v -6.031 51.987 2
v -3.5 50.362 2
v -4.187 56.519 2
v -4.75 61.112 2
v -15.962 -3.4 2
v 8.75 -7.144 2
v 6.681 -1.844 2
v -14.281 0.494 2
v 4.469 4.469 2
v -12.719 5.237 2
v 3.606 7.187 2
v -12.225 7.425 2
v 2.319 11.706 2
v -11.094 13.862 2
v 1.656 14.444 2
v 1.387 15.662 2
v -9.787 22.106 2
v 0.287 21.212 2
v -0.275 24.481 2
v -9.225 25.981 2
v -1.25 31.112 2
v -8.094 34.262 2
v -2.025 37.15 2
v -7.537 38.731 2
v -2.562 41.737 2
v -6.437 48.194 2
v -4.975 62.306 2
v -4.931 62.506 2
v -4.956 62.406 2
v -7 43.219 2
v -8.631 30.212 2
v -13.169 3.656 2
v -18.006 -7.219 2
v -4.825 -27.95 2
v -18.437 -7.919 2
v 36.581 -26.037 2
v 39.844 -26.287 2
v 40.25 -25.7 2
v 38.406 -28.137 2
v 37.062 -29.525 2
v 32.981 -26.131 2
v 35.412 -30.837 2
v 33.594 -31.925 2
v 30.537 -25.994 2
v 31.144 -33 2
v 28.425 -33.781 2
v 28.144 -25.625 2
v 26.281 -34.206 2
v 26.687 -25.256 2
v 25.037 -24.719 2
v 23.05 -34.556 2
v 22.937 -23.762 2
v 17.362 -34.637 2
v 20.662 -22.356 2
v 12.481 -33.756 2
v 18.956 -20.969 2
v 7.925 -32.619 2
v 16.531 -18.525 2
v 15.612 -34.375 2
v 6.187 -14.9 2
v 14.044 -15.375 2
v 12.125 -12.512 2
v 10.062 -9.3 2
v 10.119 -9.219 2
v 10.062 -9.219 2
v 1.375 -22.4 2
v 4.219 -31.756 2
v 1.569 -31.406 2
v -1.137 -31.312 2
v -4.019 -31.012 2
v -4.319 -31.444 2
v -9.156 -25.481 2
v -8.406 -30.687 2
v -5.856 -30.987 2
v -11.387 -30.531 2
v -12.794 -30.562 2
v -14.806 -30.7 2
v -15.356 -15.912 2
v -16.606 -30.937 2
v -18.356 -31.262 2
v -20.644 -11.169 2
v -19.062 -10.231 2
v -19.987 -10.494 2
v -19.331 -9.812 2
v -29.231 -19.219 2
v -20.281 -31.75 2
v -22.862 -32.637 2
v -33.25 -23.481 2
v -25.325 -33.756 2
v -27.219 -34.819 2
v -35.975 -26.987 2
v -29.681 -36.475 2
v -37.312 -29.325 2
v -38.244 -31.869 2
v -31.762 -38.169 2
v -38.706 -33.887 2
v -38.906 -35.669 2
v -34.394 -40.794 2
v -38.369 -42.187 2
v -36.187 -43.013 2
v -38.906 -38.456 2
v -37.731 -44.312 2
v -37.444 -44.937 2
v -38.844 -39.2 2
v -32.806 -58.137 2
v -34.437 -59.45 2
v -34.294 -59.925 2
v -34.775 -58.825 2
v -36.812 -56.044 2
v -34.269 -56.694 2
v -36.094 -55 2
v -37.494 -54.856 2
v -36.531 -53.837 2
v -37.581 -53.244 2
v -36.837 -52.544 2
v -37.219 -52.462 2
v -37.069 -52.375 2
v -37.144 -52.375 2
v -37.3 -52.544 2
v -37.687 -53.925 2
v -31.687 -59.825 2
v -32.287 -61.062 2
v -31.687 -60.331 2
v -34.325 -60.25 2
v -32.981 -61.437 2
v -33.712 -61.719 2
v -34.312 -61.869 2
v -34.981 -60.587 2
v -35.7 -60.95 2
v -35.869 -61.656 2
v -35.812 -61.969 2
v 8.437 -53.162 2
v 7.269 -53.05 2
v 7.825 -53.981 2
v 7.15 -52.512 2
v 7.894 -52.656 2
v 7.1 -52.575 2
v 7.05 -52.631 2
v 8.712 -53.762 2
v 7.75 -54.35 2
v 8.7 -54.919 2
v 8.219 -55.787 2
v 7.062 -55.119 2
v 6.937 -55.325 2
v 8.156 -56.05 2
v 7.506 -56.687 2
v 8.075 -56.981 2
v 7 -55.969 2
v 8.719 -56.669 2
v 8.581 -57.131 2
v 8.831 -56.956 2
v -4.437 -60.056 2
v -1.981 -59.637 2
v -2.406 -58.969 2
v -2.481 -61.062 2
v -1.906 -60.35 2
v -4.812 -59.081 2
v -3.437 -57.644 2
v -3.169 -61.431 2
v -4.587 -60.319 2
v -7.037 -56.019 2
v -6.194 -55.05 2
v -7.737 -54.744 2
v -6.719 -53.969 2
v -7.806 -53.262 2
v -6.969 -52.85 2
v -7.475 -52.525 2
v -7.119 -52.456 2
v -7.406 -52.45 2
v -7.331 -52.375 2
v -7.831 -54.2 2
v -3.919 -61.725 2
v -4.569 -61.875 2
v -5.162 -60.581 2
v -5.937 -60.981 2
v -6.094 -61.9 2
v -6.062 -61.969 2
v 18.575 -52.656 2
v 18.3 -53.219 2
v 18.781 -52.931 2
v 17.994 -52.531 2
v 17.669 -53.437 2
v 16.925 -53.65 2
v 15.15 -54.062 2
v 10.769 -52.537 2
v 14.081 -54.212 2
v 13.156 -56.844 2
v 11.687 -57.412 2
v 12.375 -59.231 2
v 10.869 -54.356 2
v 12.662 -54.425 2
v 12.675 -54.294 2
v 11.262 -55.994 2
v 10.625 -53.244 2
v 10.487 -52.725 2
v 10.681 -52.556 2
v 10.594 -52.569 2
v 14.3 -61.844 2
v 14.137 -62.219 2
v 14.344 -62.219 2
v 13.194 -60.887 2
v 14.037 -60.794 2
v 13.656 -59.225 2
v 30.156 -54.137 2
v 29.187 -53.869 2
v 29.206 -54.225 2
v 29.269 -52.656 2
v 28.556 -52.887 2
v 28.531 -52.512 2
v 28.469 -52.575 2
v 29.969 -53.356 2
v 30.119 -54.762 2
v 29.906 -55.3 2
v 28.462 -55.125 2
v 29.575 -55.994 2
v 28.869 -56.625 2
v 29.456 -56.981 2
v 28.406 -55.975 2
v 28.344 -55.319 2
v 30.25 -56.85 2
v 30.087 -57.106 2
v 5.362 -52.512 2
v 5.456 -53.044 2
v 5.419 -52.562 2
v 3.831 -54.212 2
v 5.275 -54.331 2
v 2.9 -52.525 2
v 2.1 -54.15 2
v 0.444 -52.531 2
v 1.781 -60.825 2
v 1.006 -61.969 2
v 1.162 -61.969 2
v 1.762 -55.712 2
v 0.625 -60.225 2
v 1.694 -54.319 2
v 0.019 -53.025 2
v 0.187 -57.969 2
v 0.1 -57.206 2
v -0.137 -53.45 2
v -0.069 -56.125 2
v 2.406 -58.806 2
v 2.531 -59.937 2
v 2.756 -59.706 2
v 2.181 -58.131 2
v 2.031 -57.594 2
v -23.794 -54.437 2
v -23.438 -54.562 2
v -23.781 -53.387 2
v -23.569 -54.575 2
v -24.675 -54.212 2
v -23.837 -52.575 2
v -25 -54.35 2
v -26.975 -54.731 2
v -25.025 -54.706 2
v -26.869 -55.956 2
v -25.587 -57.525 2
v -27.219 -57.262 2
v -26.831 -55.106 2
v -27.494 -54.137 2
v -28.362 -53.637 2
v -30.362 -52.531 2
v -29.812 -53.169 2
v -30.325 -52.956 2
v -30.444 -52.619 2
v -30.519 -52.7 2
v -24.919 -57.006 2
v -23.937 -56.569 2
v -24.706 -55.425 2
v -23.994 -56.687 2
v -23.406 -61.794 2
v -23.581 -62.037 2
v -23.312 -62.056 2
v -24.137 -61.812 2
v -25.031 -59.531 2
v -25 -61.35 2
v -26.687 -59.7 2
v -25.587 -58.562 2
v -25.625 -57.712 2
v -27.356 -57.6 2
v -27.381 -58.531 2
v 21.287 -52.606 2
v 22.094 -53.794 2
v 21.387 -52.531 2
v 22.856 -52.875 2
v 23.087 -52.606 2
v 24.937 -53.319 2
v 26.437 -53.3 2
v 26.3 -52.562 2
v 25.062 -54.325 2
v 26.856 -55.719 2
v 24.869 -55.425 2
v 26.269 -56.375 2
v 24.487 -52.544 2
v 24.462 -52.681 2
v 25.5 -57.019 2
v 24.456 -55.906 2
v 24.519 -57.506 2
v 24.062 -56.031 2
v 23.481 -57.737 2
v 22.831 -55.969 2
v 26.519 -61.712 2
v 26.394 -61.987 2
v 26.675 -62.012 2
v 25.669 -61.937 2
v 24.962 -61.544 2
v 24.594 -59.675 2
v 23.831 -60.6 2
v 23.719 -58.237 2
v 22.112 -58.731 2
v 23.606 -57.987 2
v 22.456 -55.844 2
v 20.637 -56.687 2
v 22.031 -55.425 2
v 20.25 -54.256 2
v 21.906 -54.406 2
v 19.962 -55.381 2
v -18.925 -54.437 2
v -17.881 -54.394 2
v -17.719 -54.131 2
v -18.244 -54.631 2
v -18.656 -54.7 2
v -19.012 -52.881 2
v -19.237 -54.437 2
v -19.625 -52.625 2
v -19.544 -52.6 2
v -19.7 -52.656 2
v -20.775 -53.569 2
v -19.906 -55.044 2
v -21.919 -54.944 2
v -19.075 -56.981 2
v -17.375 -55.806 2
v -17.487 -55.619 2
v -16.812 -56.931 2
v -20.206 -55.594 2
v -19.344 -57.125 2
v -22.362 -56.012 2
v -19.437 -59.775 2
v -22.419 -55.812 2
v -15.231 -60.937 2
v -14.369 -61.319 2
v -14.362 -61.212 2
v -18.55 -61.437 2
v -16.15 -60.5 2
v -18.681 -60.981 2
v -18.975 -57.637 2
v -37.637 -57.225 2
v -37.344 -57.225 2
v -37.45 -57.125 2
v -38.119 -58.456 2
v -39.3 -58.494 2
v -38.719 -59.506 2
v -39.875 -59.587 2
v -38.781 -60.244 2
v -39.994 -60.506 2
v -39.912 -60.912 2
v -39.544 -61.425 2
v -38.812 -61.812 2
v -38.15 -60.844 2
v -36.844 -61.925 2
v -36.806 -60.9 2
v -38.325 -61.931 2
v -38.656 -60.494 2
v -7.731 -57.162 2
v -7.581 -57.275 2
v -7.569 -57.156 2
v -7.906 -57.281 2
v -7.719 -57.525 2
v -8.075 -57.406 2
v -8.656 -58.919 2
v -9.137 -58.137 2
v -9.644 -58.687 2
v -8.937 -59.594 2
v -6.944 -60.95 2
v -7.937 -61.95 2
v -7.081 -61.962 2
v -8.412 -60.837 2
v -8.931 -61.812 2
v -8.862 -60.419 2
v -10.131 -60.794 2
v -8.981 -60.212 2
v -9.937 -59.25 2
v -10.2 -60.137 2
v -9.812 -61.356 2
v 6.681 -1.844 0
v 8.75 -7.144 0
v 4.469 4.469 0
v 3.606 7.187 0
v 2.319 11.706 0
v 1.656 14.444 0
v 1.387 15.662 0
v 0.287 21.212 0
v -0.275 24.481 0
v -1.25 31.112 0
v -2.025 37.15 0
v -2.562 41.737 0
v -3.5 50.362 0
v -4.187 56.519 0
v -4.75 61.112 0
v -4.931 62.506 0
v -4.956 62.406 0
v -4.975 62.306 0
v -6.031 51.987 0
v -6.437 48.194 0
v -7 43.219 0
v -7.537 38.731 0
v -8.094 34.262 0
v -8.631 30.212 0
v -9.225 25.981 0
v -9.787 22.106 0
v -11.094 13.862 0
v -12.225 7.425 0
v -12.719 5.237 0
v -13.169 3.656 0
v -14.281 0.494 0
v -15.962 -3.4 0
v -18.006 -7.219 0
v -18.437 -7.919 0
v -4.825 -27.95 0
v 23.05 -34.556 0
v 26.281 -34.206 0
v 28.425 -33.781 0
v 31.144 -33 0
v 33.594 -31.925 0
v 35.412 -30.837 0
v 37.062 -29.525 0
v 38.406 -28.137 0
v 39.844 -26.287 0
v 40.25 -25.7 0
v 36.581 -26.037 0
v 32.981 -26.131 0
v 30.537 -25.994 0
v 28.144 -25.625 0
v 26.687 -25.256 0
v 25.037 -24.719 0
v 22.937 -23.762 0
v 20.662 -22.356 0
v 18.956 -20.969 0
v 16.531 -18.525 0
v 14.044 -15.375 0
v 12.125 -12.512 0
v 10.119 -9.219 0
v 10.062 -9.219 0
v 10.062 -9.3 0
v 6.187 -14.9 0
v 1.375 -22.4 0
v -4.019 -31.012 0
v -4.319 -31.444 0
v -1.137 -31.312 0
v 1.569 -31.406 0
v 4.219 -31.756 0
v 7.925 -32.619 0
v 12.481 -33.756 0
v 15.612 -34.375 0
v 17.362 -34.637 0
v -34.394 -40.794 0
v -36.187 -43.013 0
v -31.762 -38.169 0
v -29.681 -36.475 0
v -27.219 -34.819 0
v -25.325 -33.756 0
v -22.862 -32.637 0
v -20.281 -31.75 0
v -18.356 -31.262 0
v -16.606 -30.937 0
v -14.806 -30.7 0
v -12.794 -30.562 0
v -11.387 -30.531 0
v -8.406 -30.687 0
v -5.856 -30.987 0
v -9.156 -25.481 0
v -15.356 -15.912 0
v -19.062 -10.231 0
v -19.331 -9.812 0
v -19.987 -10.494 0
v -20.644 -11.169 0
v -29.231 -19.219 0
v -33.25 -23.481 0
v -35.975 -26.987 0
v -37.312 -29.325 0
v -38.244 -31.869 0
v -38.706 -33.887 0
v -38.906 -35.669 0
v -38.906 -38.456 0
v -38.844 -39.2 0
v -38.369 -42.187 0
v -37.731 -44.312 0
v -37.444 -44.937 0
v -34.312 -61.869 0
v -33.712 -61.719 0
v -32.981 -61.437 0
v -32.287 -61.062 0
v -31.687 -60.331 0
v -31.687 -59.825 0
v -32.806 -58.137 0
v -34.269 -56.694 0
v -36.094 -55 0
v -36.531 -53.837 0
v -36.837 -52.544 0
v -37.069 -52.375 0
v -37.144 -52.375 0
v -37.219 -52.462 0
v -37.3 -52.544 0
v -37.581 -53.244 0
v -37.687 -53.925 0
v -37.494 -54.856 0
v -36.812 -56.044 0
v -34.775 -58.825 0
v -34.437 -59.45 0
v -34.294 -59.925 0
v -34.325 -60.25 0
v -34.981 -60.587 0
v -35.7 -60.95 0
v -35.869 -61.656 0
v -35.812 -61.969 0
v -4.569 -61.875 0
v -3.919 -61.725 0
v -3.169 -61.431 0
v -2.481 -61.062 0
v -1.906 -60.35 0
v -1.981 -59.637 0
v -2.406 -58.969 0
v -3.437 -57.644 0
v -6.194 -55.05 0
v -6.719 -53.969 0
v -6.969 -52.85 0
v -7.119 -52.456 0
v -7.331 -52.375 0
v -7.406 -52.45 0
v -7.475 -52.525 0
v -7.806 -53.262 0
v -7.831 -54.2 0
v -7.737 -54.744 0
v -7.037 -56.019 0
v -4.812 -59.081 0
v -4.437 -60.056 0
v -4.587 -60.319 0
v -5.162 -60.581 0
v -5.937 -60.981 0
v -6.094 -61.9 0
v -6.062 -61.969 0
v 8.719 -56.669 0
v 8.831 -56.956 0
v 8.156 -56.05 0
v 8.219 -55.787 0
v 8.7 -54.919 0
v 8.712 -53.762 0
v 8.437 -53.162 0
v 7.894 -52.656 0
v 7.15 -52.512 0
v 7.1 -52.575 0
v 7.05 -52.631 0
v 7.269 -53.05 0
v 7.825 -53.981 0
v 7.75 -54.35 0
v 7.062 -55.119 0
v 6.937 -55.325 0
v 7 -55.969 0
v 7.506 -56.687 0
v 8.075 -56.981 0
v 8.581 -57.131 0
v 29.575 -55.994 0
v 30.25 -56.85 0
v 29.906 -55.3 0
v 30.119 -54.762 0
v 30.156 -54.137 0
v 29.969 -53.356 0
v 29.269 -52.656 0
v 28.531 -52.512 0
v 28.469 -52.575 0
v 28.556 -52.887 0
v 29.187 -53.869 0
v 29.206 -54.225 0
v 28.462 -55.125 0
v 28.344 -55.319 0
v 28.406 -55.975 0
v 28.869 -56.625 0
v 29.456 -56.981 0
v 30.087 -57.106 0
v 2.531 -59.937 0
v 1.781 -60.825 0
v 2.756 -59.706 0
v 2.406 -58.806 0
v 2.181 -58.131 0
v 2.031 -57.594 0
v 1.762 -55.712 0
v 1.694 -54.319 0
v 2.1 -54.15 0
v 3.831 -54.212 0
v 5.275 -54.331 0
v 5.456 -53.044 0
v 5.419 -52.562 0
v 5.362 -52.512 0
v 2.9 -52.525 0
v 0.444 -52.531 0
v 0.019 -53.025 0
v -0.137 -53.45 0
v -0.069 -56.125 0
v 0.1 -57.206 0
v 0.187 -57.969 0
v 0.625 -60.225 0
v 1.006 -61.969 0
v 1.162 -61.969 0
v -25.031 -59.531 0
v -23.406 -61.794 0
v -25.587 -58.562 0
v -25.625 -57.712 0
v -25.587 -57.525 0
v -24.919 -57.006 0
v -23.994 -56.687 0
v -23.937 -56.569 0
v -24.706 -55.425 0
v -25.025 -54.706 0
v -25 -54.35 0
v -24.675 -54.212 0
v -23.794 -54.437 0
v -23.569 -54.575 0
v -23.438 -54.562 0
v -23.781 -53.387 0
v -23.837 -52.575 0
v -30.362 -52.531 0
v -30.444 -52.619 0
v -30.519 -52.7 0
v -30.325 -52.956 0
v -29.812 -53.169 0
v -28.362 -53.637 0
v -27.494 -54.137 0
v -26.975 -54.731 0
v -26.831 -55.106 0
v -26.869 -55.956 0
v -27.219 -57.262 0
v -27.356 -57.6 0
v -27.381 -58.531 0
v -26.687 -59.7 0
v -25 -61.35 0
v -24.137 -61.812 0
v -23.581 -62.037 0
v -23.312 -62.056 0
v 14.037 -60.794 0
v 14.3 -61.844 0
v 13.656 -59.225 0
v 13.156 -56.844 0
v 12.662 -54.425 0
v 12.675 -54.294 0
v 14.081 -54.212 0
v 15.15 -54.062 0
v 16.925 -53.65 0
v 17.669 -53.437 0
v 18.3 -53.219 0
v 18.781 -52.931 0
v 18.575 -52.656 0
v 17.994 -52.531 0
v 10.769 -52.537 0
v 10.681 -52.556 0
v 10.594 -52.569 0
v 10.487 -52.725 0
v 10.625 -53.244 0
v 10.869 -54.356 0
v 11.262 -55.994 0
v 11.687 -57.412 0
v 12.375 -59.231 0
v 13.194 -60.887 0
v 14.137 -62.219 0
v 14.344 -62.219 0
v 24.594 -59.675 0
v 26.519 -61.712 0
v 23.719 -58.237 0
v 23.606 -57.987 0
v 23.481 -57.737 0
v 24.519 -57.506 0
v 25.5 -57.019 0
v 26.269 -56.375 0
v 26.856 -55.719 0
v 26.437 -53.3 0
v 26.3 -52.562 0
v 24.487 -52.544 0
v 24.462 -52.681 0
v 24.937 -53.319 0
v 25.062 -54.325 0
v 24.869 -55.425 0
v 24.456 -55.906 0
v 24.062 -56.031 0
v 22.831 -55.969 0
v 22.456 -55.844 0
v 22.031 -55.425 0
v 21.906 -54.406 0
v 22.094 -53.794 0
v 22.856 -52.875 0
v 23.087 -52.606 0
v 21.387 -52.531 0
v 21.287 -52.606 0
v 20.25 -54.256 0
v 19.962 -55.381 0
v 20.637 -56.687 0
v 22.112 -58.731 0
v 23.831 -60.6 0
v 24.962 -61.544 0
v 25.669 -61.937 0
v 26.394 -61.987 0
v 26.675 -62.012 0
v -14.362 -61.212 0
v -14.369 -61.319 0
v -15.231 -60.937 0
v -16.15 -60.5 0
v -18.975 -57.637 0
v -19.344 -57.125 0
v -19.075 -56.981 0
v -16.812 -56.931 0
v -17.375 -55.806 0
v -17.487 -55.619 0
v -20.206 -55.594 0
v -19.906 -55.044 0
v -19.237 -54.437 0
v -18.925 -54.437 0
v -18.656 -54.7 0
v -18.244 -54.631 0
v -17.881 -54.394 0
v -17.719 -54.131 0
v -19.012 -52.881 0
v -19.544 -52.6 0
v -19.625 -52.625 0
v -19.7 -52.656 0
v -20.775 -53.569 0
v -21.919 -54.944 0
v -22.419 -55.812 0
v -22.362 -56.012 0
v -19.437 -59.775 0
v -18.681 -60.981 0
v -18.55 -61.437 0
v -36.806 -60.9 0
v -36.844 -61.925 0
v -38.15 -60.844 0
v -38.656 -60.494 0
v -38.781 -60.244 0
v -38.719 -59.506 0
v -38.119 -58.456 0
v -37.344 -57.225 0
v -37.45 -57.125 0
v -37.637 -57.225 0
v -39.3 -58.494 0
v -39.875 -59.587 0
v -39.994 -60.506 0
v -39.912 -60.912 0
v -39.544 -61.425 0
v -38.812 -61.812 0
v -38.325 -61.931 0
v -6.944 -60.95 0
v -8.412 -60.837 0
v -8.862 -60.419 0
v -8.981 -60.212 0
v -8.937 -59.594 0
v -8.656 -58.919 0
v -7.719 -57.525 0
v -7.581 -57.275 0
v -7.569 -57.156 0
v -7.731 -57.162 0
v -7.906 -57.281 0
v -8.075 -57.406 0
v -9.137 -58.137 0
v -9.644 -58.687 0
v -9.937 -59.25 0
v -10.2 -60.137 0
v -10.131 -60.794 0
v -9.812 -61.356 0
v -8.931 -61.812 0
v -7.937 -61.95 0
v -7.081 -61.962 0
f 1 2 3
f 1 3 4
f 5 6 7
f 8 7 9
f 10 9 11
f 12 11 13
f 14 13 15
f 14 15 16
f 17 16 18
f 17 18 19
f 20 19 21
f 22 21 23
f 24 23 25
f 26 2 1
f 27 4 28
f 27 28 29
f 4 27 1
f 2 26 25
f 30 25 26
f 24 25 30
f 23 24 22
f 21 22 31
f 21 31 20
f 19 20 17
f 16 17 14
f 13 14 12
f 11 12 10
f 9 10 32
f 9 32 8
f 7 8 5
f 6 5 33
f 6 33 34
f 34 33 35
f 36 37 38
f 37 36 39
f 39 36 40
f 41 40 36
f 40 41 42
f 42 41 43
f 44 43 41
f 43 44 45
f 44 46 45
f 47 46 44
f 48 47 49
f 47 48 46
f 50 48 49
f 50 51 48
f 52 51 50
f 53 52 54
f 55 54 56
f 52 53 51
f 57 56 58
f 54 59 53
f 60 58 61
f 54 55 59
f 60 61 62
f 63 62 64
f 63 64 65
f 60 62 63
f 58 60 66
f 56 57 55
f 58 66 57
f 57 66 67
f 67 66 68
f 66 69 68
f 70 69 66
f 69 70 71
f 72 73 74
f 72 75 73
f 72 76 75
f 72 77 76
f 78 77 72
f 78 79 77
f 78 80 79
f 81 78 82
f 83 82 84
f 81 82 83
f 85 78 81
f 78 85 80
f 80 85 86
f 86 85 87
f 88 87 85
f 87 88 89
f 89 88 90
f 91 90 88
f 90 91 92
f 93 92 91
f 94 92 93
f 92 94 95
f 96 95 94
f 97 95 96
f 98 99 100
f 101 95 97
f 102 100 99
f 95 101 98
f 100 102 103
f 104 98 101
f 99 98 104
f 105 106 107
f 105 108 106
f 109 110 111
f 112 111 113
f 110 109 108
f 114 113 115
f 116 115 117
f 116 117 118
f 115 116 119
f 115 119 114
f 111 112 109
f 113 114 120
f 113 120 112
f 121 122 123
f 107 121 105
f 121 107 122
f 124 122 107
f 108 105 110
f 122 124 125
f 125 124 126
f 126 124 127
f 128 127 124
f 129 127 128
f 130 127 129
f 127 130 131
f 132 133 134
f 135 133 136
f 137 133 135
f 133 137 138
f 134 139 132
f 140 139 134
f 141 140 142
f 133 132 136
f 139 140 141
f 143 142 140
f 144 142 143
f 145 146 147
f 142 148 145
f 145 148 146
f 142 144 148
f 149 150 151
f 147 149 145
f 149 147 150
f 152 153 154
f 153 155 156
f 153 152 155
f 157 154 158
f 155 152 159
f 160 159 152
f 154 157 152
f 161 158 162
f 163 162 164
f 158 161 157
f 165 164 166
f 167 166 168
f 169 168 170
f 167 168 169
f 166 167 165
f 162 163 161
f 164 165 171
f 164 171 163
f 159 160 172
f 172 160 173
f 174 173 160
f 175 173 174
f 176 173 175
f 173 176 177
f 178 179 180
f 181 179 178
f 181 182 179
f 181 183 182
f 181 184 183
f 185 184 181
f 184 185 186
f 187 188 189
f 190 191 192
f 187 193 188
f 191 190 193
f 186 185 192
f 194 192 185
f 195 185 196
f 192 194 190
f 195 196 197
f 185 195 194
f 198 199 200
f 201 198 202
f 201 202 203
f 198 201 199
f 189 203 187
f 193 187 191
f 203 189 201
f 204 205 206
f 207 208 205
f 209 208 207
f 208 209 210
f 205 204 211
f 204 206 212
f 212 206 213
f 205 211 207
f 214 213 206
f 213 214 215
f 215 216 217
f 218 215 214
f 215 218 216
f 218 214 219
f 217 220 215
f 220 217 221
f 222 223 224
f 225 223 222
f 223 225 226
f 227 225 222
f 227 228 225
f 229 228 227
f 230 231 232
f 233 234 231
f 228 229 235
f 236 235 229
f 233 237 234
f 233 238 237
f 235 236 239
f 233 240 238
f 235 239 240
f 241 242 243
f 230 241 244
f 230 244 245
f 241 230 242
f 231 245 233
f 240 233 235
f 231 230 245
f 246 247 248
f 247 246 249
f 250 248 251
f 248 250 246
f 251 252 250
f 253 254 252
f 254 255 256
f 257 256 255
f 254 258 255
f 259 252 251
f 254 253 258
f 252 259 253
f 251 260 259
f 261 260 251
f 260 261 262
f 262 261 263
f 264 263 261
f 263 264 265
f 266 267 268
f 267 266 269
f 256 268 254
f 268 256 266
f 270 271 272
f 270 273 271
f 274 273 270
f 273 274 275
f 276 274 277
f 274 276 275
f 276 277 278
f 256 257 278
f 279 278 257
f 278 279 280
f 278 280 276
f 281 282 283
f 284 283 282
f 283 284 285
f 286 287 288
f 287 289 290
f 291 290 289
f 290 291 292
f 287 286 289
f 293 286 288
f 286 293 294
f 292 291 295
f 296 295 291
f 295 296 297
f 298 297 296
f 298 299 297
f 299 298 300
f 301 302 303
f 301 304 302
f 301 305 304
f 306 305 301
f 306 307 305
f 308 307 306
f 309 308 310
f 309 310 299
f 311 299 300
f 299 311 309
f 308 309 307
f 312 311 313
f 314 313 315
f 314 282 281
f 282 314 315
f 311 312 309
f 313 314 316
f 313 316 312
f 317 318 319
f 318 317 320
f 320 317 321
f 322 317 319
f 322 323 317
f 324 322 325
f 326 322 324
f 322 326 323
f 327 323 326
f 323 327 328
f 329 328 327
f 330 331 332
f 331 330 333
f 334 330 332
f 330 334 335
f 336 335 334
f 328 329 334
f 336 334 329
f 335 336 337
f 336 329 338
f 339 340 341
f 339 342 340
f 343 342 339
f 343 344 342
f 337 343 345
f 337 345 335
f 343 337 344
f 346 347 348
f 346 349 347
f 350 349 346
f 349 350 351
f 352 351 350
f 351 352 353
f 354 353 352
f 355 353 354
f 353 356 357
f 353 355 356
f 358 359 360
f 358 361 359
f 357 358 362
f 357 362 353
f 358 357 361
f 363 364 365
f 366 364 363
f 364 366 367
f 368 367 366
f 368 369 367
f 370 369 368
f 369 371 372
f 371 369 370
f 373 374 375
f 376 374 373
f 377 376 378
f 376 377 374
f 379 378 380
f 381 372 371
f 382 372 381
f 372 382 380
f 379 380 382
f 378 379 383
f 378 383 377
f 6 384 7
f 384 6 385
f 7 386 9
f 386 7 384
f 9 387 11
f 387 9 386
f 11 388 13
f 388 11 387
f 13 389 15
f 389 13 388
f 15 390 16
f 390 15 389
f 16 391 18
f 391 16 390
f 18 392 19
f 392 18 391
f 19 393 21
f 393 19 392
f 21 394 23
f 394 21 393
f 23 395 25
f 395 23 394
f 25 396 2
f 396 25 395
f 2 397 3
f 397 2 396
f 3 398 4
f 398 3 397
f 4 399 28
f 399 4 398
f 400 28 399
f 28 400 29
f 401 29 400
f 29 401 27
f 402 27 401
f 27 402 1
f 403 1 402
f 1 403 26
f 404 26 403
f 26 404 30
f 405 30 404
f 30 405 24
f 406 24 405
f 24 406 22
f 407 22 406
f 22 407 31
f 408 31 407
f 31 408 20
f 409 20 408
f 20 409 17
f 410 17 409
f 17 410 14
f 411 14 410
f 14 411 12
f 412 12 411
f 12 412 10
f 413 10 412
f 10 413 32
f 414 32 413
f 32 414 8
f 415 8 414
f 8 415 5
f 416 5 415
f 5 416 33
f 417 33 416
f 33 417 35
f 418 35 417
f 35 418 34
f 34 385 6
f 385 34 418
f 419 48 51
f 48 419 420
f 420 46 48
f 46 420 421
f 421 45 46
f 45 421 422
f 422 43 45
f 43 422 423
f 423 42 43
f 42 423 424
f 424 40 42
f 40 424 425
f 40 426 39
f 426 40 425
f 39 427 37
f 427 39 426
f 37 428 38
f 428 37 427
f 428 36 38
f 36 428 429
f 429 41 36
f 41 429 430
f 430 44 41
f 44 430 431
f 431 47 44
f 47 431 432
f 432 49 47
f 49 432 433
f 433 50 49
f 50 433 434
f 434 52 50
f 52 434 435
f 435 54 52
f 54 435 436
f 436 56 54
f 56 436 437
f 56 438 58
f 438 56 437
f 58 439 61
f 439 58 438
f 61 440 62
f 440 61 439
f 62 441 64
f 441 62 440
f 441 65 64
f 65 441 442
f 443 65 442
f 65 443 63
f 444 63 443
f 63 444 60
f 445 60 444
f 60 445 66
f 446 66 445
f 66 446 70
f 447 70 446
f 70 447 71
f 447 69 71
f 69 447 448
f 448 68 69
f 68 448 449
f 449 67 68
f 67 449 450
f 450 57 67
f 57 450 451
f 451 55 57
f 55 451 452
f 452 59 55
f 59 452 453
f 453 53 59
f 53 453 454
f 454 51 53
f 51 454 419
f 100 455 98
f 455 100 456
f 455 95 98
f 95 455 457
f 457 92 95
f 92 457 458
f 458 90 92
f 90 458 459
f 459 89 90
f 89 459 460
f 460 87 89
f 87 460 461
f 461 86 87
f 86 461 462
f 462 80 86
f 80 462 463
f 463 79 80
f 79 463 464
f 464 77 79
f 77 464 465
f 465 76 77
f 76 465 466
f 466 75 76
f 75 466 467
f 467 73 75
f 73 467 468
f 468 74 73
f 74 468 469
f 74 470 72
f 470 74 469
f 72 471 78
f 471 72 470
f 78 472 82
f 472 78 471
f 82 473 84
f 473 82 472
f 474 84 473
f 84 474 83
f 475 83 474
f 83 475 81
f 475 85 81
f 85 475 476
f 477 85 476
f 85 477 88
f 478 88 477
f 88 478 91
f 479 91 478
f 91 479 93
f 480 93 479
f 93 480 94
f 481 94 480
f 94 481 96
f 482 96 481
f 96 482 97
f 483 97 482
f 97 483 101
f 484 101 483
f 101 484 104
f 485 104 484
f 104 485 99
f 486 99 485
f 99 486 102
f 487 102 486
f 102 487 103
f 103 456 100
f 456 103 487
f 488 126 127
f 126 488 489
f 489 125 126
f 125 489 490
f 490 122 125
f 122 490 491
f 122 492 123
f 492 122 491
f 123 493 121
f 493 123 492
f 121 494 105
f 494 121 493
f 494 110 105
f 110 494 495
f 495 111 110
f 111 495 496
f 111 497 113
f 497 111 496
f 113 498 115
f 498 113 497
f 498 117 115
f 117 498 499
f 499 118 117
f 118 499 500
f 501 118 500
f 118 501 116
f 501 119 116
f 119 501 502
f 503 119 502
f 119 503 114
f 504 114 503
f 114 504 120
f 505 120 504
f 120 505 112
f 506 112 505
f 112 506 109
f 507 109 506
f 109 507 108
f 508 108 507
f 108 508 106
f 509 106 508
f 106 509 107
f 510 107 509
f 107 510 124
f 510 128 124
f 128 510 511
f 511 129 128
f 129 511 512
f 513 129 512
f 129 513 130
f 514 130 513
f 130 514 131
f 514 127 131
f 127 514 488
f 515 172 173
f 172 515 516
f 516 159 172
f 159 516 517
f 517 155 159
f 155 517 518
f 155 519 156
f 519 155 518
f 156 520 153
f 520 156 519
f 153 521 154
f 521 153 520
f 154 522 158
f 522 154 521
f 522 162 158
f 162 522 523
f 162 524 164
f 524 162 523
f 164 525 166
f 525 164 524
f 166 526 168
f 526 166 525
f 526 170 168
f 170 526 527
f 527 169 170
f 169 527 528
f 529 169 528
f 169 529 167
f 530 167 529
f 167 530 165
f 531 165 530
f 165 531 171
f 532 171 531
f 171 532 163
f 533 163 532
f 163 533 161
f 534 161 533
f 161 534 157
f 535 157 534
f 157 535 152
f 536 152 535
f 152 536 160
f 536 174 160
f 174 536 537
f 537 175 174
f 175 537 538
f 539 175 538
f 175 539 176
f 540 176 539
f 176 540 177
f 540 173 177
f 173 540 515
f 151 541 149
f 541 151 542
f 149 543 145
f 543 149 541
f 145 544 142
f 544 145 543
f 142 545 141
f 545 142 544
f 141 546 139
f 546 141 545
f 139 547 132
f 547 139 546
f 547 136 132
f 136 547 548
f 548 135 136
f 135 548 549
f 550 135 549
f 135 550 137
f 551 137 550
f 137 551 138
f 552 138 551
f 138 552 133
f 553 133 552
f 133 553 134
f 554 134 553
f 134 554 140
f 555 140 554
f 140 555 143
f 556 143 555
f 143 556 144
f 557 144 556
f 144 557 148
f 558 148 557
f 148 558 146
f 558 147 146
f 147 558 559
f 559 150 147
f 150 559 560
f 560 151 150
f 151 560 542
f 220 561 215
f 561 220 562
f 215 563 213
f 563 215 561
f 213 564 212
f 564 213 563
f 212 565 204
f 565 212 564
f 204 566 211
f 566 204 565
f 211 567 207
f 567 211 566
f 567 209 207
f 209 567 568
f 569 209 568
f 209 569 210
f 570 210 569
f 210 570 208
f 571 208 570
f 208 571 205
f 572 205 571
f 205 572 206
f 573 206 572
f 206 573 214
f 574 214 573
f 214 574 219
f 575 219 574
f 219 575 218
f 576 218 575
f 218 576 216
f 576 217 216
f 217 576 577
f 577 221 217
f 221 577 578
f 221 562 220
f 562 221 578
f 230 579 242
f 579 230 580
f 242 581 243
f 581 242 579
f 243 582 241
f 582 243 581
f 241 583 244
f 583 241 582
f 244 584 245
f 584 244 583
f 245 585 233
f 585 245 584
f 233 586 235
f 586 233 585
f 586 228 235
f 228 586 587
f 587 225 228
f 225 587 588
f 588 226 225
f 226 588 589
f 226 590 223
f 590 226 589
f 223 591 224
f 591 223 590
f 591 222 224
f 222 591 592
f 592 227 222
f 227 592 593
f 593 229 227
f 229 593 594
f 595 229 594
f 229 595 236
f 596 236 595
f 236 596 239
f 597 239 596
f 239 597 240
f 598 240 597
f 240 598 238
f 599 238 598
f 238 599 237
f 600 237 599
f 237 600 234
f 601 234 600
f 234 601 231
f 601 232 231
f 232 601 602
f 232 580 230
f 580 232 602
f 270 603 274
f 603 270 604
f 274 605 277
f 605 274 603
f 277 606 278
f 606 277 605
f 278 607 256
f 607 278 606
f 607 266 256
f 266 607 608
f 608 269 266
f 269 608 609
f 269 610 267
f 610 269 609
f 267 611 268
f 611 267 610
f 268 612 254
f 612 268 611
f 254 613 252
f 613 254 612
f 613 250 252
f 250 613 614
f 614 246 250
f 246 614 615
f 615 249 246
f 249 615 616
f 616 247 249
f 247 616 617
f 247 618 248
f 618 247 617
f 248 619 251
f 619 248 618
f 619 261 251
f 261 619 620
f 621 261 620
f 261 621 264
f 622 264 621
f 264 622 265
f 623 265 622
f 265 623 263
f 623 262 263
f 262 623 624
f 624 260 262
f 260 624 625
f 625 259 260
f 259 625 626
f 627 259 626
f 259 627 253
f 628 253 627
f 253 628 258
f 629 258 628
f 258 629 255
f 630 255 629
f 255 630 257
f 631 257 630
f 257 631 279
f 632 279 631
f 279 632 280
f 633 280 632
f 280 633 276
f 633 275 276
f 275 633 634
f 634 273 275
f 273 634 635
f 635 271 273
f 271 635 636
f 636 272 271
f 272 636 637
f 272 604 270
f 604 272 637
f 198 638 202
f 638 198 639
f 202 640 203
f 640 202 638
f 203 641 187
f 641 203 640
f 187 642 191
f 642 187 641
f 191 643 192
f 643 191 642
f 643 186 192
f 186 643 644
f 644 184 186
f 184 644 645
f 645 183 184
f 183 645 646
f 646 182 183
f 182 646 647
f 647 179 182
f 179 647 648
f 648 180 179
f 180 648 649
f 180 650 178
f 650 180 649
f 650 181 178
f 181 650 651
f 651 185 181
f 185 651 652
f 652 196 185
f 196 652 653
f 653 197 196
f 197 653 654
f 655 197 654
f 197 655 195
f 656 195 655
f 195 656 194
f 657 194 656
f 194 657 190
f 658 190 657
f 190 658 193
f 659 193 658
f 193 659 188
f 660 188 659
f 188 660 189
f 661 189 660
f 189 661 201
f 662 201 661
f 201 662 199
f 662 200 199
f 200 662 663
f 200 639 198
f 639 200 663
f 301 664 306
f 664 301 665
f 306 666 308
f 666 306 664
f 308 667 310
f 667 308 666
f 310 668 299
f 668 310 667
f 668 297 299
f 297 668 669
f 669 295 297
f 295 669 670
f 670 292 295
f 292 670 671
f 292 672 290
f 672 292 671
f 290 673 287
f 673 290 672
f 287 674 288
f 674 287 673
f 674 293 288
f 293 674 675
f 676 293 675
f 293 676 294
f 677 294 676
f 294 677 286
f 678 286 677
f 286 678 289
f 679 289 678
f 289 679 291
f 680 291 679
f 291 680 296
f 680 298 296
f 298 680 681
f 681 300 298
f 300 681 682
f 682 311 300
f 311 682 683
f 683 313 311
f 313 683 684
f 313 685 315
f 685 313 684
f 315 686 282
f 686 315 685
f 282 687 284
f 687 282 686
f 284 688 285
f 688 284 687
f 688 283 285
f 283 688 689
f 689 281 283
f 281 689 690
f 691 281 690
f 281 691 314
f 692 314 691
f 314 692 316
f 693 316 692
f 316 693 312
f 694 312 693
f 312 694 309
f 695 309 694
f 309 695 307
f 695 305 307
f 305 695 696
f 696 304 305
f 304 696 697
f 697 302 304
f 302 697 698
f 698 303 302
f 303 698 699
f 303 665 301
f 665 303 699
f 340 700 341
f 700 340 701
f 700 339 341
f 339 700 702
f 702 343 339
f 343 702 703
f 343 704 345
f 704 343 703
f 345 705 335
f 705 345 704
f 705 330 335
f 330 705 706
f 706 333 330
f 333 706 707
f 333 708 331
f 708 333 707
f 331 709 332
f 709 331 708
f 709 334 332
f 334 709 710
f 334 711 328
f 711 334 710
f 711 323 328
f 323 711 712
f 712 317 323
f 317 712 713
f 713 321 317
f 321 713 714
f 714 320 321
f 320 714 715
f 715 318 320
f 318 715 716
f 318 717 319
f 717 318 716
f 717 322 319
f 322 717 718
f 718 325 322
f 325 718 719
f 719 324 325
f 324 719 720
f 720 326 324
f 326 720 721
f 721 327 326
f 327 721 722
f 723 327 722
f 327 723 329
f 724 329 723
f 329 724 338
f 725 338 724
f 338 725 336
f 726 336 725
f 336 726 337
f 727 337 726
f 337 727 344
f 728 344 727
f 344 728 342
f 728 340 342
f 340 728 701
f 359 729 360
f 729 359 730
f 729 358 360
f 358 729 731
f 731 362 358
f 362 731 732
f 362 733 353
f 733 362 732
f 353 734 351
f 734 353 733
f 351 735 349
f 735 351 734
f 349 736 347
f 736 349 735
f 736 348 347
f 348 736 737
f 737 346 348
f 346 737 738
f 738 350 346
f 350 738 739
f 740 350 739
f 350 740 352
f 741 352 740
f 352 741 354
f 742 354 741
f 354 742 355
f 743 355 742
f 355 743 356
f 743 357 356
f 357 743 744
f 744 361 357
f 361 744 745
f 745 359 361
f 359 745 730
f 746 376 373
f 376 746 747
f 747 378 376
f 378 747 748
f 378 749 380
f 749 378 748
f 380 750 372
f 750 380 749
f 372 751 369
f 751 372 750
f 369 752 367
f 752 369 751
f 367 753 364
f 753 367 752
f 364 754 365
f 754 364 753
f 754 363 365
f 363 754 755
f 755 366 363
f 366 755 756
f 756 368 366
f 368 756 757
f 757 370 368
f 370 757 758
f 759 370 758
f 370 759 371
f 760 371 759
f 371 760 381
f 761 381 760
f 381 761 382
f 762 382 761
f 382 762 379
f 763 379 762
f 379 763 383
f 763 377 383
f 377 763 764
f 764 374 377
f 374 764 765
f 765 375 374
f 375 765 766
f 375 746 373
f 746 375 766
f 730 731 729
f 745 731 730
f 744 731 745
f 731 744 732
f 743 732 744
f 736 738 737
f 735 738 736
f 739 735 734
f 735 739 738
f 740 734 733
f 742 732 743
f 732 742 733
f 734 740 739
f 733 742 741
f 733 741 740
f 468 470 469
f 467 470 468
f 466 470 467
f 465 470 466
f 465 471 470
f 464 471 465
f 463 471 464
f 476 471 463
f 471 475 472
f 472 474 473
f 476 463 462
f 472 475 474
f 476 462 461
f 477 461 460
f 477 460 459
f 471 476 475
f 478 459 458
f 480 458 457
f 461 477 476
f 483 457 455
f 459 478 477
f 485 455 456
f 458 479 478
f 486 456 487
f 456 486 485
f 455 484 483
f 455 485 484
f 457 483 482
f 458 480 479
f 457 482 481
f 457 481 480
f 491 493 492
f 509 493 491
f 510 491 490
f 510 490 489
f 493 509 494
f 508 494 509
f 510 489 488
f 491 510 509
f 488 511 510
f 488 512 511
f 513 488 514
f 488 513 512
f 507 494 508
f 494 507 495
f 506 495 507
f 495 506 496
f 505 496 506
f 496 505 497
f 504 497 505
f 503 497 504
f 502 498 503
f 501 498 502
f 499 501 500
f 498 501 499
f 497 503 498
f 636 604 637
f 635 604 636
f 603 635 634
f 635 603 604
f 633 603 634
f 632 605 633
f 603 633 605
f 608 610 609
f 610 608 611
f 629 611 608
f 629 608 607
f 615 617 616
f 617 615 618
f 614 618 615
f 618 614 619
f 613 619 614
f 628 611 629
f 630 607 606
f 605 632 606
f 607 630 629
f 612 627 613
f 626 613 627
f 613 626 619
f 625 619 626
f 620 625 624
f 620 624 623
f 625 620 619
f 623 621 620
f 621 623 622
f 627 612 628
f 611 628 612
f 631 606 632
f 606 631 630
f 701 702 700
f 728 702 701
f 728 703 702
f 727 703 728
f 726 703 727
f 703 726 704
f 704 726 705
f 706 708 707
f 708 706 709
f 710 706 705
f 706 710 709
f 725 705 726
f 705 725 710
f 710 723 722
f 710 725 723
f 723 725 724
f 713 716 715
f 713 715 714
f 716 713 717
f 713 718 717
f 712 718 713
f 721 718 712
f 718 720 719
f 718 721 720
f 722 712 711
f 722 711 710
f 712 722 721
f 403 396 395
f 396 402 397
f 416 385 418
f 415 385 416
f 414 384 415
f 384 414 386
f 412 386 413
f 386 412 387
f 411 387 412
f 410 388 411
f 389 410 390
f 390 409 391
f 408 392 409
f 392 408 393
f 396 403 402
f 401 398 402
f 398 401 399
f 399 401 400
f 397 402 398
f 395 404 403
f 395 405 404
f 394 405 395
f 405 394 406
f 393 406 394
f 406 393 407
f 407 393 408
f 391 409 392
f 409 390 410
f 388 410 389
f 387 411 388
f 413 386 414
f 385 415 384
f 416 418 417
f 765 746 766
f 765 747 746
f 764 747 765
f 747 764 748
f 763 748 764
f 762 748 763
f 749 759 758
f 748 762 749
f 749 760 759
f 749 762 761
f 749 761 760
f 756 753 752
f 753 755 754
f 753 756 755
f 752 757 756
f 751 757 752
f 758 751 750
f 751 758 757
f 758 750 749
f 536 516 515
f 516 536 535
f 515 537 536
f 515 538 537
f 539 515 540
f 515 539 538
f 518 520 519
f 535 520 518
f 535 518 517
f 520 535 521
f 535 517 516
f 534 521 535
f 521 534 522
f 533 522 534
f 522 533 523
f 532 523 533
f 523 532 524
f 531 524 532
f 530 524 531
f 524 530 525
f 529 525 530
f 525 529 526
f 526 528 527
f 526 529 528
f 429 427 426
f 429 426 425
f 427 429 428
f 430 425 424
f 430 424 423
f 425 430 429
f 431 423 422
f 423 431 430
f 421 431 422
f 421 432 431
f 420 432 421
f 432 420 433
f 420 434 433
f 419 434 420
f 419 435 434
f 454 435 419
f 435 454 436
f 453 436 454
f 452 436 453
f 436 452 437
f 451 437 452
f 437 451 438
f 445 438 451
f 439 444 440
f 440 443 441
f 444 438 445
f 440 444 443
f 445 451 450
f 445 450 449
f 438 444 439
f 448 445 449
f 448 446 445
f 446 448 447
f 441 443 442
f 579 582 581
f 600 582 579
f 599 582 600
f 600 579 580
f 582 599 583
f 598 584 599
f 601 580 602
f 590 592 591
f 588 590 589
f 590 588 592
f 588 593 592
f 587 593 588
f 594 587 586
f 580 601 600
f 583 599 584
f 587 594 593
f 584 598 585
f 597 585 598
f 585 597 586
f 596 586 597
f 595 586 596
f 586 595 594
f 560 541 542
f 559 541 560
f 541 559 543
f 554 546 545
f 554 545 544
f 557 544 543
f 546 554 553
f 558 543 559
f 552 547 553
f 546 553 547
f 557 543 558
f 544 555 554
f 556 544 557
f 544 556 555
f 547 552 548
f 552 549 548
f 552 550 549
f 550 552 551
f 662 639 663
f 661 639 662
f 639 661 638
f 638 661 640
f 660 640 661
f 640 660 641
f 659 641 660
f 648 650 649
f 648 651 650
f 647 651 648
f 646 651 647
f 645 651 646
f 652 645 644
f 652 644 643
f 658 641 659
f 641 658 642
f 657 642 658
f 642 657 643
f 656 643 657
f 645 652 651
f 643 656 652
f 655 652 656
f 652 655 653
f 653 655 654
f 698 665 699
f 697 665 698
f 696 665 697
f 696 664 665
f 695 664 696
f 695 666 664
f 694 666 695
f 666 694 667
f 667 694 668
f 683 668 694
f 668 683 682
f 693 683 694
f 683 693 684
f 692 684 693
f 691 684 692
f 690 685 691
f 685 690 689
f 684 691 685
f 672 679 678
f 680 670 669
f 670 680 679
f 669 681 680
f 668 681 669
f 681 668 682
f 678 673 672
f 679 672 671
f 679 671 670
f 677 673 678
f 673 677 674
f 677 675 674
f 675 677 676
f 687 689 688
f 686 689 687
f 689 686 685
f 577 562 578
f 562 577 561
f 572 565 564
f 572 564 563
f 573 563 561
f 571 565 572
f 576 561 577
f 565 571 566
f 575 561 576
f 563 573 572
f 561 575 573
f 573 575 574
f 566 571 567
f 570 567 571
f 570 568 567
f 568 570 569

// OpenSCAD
module 4c88c1166f7f67f27693be3abd35f812_1()
{
 /* Generated by trace2scad version 20150415
    http://aggregate.org/MAKE/TRACE2SCAD/
    Optimized model has 387/4796 original points
 */
 color([0.48, 0.48, 0.48])
 assign(minx=0) /* polygon minx=39 */
 assign(miny=0) /* polygon miny=45 */
 assign(maxx=12880) /* polygon maxx=12880 */
 assign(maxy=20000) /* polygon maxy=20001 */
 assign(dx=maxx-minx)
 assign(dy=maxy-miny)
 assign(maxd=((dx>dy)?dx:dy))
 scale([1/maxd, 1/maxd, 1])
 translate([-minx-dx/2, -miny-dy/2, 0])
 linear_extrude(height=1, convexity=387)
 union() {
  union() {
   polygon([[5647,19985],[5644,19969],[5475,18318],[5410,17711],[5320,16915],[5234,16197],[5145,15482],[5059,14834],[4964,14157],[4874,13537],[4665,12218],[4484,11188],[4405,10838],[4333,10585],[4155,10079],[3886,9456],[3559,8845],[3490,8733],[5668,5528],[7840,8857],[7509,9705],[7155,10715],[7017,11150],[6811,11873],[6705,12311],[6662,12506],[6486,13394],[6396,13917],[6240,14978],[6116,15944],[6030,16678],[5880,18058],[5770,19043],[5680,19778],[5651,20001]], convexity=6);
   polygon([[8050,8518],[8050,8512],[7430,7616],[6660,6416],[5797,5038],[5749,4969],[6258,4990],[6691,4975],[7115,4919],[7708,4781],[8437,4599],[8938,4500],[9218,4458],[10128,4471],[10645,4527],[10988,4595],[11423,4720],[11815,4892],[12106,5066],[12370,5276],[12585,5498],[12815,5794],[12880,5888],[12293,5834],[11717,5819],[11326,5841],[10943,5900],[10710,5959],[10446,6045],[10110,6198],[9746,6423],[9473,6645],[9085,7036],[8687,7540],[8380,7998],[8059,8525],[8050,8525]], convexity=9);
   polygon([[3242,8321],[3137,8213],[1763,6925],[1120,6243],[684,5682],[470,5308],[321,4901],[247,4578],[215,4293],[215,3847],[225,3728],[301,3250],[403,2910],[449,2810],[650,3118],[937,3473],[1358,3893],[1691,4164],[2085,4429],[2388,4599],[2782,4778],[3195,4920],[3503,4998],[3783,5050],[4071,5088],[4393,5110],[4618,5115],[5095,5090],[5503,5042],[4975,5923],[3983,7454],[3390,8363],[3347,8430]], convexity=7);
   polygon([[485,1606],[472,1593],[427,1481],[410,1372],[441,1223],[550,1033],[876,588],[930,488],[953,412],[948,360],[843,306],[728,248],[701,135],[710,85],[950,101],[1046,125],[1163,170],[1274,230],[1370,347],[1370,428],[1191,698],[957,929],[665,1200],[595,1386],[546,1593],[509,1620],[497,1620]], convexity=8);
   polygon([[5255,1608],[5244,1596],[5191,1478],[5187,1328],[5202,1241],[5314,1037],[5670,547],[5730,391],[5706,349],[5614,307],[5490,243],[5465,96],[5470,85],[5709,100],[5813,124],[5933,171],[6043,230],[6135,344],[6123,458],[6055,565],[5890,777],[5449,1192],[5365,1365],[5325,1544],[5301,1607],[5267,1620]], convexity=8);
   polygon([[6904,1596],[6511,1595],[6443,1516],[6418,1448],[6429,1020],[6456,847],[6470,725],[6540,364],[6601,85],[6626,85],[6725,268],[6845,410],[6881,447],[6825,591],[6789,699],[6765,785],[6722,1086],[6711,1309],[6776,1336],[7053,1326],[7284,1307],[7313,1513],[7307,1590],[7298,1598]], convexity=10);
   polygon([[7576,1588],[7568,1579],[7603,1512],[7692,1363],[7680,1304],[7570,1181],[7550,1148],[7560,1045],[7641,930],[7732,883],[7813,859],[7853,887],[7835,933],[7745,1032],[7755,1074],[7832,1213],[7834,1398],[7790,1494],[7703,1575],[7584,1598]], convexity=10);
   polygon([[11000,1593],[10995,1588],[11009,1538],[11110,1381],[11113,1324],[10994,1180],[10975,1149],[10985,1044],[11059,940],[11153,883],[11254,863],[11280,904],[11172,1041],[11225,1152],[11259,1238],[11265,1338],[11235,1463],[11123,1575],[11005,1598]], convexity=10);
   polygon([[1569,1581],[1557,1568],[1588,1527],[1670,1493],[1902,1418],[2041,1338],[2124,1243],[2147,1183],[2141,1047],[2085,838],[2063,784],[2059,635],[2170,448],[2440,184],[2578,110],[2667,74],[2710,71],[2695,113],[2435,475],[2346,630],[2340,766],[2346,796],[2453,879],[2601,930],[2610,949],[2487,1132],[2436,1247],[2440,1304],[2492,1326],[2633,1290],[2669,1268],[2690,1270],[2635,1458],[2626,1588],[1582,1595]], convexity=13);
   polygon([[8149,1591],[8135,1589],[8118,1564],[8140,1481],[8179,1303],[8242,1041],[8310,814],[8420,523],[8551,258],[8702,45],[8735,45],[8728,105],[8686,273],[8625,524],[8545,905],[8466,1292],[8468,1313],[8693,1326],[8864,1350],[9148,1416],[9267,1450],[9368,1485],[9445,1531],[9412,1575],[9319,1595],[8163,1594]], convexity=9);
   polygon([[9854,1589],[9846,1583],[9680,1319],[9634,1139],[9742,930],[9978,603],[10253,304],[10434,153],[10547,90],[10663,82],[10708,78],[10683,126],[10375,452],[10235,682],[10217,722],[10197,762],[10363,799],[10520,877],[10643,980],[10737,1085],[10670,1472],[10648,1590],[10358,1593],[10354,1571],[10430,1469],[10450,1308],[10419,1132],[10353,1055],[10290,1035],[10093,1045],[10033,1065],[9965,1132],[9945,1295],[9975,1393],[10097,1540],[10134,1583],[9862,1595]], convexity=13);
   polygon([[3300,1580],[3288,1575],[3116,1429],[2933,1209],[2853,1070],[2862,1038],[3330,436],[3451,243],[3472,170],[4141,189],[4142,206],[4003,250],[3856,320],[3404,778],[3345,860],[3388,883],[3750,891],[3660,1071],[3642,1101],[3207,1105],[3255,1193],[3362,1290],[3412,1290],[3455,1248],[3521,1259],[3579,1297],[3605,1339],[3398,1539],[3313,1584]], convexity=12);
   polygon([[433,852],[418,844],[152,641],[60,466],[41,319],[54,254],[113,172],[230,110],[308,91],[545,92],[551,256],[336,265],[255,321],[235,361],[245,479],[341,647],[465,844],[448,860]], convexity=8);
   polygon([[5175,835],[5148,815],[4978,698],[4897,610],[4850,520],[4808,378],[4819,273],[4870,183],[5011,110],[5170,88],[5307,86],[5329,248],[5094,266],[5022,333],[5003,366],[5010,465],[5055,573],[5205,796],[5227,836],[5229,855],[5203,854]], convexity=8);
  }
 }
}

module 4c88c1166f7f67f27693be3abd35f812()
{
 /* all layers combined, scaled to within a 1mm cube */
 scale([1, 1, 1/1])
 difference() {
  union() {
   scale([1,1,2]) translate([0,0,-0.5]) 4c88c1166f7f67f27693be3abd35f812_1();
  }
  translate([0,0,-2]) cube([2,2,4],center=true);
 }
}

scale([125, 125, 2]) {
	4c88c1166f7f67f27693be3abd35f812();
}
